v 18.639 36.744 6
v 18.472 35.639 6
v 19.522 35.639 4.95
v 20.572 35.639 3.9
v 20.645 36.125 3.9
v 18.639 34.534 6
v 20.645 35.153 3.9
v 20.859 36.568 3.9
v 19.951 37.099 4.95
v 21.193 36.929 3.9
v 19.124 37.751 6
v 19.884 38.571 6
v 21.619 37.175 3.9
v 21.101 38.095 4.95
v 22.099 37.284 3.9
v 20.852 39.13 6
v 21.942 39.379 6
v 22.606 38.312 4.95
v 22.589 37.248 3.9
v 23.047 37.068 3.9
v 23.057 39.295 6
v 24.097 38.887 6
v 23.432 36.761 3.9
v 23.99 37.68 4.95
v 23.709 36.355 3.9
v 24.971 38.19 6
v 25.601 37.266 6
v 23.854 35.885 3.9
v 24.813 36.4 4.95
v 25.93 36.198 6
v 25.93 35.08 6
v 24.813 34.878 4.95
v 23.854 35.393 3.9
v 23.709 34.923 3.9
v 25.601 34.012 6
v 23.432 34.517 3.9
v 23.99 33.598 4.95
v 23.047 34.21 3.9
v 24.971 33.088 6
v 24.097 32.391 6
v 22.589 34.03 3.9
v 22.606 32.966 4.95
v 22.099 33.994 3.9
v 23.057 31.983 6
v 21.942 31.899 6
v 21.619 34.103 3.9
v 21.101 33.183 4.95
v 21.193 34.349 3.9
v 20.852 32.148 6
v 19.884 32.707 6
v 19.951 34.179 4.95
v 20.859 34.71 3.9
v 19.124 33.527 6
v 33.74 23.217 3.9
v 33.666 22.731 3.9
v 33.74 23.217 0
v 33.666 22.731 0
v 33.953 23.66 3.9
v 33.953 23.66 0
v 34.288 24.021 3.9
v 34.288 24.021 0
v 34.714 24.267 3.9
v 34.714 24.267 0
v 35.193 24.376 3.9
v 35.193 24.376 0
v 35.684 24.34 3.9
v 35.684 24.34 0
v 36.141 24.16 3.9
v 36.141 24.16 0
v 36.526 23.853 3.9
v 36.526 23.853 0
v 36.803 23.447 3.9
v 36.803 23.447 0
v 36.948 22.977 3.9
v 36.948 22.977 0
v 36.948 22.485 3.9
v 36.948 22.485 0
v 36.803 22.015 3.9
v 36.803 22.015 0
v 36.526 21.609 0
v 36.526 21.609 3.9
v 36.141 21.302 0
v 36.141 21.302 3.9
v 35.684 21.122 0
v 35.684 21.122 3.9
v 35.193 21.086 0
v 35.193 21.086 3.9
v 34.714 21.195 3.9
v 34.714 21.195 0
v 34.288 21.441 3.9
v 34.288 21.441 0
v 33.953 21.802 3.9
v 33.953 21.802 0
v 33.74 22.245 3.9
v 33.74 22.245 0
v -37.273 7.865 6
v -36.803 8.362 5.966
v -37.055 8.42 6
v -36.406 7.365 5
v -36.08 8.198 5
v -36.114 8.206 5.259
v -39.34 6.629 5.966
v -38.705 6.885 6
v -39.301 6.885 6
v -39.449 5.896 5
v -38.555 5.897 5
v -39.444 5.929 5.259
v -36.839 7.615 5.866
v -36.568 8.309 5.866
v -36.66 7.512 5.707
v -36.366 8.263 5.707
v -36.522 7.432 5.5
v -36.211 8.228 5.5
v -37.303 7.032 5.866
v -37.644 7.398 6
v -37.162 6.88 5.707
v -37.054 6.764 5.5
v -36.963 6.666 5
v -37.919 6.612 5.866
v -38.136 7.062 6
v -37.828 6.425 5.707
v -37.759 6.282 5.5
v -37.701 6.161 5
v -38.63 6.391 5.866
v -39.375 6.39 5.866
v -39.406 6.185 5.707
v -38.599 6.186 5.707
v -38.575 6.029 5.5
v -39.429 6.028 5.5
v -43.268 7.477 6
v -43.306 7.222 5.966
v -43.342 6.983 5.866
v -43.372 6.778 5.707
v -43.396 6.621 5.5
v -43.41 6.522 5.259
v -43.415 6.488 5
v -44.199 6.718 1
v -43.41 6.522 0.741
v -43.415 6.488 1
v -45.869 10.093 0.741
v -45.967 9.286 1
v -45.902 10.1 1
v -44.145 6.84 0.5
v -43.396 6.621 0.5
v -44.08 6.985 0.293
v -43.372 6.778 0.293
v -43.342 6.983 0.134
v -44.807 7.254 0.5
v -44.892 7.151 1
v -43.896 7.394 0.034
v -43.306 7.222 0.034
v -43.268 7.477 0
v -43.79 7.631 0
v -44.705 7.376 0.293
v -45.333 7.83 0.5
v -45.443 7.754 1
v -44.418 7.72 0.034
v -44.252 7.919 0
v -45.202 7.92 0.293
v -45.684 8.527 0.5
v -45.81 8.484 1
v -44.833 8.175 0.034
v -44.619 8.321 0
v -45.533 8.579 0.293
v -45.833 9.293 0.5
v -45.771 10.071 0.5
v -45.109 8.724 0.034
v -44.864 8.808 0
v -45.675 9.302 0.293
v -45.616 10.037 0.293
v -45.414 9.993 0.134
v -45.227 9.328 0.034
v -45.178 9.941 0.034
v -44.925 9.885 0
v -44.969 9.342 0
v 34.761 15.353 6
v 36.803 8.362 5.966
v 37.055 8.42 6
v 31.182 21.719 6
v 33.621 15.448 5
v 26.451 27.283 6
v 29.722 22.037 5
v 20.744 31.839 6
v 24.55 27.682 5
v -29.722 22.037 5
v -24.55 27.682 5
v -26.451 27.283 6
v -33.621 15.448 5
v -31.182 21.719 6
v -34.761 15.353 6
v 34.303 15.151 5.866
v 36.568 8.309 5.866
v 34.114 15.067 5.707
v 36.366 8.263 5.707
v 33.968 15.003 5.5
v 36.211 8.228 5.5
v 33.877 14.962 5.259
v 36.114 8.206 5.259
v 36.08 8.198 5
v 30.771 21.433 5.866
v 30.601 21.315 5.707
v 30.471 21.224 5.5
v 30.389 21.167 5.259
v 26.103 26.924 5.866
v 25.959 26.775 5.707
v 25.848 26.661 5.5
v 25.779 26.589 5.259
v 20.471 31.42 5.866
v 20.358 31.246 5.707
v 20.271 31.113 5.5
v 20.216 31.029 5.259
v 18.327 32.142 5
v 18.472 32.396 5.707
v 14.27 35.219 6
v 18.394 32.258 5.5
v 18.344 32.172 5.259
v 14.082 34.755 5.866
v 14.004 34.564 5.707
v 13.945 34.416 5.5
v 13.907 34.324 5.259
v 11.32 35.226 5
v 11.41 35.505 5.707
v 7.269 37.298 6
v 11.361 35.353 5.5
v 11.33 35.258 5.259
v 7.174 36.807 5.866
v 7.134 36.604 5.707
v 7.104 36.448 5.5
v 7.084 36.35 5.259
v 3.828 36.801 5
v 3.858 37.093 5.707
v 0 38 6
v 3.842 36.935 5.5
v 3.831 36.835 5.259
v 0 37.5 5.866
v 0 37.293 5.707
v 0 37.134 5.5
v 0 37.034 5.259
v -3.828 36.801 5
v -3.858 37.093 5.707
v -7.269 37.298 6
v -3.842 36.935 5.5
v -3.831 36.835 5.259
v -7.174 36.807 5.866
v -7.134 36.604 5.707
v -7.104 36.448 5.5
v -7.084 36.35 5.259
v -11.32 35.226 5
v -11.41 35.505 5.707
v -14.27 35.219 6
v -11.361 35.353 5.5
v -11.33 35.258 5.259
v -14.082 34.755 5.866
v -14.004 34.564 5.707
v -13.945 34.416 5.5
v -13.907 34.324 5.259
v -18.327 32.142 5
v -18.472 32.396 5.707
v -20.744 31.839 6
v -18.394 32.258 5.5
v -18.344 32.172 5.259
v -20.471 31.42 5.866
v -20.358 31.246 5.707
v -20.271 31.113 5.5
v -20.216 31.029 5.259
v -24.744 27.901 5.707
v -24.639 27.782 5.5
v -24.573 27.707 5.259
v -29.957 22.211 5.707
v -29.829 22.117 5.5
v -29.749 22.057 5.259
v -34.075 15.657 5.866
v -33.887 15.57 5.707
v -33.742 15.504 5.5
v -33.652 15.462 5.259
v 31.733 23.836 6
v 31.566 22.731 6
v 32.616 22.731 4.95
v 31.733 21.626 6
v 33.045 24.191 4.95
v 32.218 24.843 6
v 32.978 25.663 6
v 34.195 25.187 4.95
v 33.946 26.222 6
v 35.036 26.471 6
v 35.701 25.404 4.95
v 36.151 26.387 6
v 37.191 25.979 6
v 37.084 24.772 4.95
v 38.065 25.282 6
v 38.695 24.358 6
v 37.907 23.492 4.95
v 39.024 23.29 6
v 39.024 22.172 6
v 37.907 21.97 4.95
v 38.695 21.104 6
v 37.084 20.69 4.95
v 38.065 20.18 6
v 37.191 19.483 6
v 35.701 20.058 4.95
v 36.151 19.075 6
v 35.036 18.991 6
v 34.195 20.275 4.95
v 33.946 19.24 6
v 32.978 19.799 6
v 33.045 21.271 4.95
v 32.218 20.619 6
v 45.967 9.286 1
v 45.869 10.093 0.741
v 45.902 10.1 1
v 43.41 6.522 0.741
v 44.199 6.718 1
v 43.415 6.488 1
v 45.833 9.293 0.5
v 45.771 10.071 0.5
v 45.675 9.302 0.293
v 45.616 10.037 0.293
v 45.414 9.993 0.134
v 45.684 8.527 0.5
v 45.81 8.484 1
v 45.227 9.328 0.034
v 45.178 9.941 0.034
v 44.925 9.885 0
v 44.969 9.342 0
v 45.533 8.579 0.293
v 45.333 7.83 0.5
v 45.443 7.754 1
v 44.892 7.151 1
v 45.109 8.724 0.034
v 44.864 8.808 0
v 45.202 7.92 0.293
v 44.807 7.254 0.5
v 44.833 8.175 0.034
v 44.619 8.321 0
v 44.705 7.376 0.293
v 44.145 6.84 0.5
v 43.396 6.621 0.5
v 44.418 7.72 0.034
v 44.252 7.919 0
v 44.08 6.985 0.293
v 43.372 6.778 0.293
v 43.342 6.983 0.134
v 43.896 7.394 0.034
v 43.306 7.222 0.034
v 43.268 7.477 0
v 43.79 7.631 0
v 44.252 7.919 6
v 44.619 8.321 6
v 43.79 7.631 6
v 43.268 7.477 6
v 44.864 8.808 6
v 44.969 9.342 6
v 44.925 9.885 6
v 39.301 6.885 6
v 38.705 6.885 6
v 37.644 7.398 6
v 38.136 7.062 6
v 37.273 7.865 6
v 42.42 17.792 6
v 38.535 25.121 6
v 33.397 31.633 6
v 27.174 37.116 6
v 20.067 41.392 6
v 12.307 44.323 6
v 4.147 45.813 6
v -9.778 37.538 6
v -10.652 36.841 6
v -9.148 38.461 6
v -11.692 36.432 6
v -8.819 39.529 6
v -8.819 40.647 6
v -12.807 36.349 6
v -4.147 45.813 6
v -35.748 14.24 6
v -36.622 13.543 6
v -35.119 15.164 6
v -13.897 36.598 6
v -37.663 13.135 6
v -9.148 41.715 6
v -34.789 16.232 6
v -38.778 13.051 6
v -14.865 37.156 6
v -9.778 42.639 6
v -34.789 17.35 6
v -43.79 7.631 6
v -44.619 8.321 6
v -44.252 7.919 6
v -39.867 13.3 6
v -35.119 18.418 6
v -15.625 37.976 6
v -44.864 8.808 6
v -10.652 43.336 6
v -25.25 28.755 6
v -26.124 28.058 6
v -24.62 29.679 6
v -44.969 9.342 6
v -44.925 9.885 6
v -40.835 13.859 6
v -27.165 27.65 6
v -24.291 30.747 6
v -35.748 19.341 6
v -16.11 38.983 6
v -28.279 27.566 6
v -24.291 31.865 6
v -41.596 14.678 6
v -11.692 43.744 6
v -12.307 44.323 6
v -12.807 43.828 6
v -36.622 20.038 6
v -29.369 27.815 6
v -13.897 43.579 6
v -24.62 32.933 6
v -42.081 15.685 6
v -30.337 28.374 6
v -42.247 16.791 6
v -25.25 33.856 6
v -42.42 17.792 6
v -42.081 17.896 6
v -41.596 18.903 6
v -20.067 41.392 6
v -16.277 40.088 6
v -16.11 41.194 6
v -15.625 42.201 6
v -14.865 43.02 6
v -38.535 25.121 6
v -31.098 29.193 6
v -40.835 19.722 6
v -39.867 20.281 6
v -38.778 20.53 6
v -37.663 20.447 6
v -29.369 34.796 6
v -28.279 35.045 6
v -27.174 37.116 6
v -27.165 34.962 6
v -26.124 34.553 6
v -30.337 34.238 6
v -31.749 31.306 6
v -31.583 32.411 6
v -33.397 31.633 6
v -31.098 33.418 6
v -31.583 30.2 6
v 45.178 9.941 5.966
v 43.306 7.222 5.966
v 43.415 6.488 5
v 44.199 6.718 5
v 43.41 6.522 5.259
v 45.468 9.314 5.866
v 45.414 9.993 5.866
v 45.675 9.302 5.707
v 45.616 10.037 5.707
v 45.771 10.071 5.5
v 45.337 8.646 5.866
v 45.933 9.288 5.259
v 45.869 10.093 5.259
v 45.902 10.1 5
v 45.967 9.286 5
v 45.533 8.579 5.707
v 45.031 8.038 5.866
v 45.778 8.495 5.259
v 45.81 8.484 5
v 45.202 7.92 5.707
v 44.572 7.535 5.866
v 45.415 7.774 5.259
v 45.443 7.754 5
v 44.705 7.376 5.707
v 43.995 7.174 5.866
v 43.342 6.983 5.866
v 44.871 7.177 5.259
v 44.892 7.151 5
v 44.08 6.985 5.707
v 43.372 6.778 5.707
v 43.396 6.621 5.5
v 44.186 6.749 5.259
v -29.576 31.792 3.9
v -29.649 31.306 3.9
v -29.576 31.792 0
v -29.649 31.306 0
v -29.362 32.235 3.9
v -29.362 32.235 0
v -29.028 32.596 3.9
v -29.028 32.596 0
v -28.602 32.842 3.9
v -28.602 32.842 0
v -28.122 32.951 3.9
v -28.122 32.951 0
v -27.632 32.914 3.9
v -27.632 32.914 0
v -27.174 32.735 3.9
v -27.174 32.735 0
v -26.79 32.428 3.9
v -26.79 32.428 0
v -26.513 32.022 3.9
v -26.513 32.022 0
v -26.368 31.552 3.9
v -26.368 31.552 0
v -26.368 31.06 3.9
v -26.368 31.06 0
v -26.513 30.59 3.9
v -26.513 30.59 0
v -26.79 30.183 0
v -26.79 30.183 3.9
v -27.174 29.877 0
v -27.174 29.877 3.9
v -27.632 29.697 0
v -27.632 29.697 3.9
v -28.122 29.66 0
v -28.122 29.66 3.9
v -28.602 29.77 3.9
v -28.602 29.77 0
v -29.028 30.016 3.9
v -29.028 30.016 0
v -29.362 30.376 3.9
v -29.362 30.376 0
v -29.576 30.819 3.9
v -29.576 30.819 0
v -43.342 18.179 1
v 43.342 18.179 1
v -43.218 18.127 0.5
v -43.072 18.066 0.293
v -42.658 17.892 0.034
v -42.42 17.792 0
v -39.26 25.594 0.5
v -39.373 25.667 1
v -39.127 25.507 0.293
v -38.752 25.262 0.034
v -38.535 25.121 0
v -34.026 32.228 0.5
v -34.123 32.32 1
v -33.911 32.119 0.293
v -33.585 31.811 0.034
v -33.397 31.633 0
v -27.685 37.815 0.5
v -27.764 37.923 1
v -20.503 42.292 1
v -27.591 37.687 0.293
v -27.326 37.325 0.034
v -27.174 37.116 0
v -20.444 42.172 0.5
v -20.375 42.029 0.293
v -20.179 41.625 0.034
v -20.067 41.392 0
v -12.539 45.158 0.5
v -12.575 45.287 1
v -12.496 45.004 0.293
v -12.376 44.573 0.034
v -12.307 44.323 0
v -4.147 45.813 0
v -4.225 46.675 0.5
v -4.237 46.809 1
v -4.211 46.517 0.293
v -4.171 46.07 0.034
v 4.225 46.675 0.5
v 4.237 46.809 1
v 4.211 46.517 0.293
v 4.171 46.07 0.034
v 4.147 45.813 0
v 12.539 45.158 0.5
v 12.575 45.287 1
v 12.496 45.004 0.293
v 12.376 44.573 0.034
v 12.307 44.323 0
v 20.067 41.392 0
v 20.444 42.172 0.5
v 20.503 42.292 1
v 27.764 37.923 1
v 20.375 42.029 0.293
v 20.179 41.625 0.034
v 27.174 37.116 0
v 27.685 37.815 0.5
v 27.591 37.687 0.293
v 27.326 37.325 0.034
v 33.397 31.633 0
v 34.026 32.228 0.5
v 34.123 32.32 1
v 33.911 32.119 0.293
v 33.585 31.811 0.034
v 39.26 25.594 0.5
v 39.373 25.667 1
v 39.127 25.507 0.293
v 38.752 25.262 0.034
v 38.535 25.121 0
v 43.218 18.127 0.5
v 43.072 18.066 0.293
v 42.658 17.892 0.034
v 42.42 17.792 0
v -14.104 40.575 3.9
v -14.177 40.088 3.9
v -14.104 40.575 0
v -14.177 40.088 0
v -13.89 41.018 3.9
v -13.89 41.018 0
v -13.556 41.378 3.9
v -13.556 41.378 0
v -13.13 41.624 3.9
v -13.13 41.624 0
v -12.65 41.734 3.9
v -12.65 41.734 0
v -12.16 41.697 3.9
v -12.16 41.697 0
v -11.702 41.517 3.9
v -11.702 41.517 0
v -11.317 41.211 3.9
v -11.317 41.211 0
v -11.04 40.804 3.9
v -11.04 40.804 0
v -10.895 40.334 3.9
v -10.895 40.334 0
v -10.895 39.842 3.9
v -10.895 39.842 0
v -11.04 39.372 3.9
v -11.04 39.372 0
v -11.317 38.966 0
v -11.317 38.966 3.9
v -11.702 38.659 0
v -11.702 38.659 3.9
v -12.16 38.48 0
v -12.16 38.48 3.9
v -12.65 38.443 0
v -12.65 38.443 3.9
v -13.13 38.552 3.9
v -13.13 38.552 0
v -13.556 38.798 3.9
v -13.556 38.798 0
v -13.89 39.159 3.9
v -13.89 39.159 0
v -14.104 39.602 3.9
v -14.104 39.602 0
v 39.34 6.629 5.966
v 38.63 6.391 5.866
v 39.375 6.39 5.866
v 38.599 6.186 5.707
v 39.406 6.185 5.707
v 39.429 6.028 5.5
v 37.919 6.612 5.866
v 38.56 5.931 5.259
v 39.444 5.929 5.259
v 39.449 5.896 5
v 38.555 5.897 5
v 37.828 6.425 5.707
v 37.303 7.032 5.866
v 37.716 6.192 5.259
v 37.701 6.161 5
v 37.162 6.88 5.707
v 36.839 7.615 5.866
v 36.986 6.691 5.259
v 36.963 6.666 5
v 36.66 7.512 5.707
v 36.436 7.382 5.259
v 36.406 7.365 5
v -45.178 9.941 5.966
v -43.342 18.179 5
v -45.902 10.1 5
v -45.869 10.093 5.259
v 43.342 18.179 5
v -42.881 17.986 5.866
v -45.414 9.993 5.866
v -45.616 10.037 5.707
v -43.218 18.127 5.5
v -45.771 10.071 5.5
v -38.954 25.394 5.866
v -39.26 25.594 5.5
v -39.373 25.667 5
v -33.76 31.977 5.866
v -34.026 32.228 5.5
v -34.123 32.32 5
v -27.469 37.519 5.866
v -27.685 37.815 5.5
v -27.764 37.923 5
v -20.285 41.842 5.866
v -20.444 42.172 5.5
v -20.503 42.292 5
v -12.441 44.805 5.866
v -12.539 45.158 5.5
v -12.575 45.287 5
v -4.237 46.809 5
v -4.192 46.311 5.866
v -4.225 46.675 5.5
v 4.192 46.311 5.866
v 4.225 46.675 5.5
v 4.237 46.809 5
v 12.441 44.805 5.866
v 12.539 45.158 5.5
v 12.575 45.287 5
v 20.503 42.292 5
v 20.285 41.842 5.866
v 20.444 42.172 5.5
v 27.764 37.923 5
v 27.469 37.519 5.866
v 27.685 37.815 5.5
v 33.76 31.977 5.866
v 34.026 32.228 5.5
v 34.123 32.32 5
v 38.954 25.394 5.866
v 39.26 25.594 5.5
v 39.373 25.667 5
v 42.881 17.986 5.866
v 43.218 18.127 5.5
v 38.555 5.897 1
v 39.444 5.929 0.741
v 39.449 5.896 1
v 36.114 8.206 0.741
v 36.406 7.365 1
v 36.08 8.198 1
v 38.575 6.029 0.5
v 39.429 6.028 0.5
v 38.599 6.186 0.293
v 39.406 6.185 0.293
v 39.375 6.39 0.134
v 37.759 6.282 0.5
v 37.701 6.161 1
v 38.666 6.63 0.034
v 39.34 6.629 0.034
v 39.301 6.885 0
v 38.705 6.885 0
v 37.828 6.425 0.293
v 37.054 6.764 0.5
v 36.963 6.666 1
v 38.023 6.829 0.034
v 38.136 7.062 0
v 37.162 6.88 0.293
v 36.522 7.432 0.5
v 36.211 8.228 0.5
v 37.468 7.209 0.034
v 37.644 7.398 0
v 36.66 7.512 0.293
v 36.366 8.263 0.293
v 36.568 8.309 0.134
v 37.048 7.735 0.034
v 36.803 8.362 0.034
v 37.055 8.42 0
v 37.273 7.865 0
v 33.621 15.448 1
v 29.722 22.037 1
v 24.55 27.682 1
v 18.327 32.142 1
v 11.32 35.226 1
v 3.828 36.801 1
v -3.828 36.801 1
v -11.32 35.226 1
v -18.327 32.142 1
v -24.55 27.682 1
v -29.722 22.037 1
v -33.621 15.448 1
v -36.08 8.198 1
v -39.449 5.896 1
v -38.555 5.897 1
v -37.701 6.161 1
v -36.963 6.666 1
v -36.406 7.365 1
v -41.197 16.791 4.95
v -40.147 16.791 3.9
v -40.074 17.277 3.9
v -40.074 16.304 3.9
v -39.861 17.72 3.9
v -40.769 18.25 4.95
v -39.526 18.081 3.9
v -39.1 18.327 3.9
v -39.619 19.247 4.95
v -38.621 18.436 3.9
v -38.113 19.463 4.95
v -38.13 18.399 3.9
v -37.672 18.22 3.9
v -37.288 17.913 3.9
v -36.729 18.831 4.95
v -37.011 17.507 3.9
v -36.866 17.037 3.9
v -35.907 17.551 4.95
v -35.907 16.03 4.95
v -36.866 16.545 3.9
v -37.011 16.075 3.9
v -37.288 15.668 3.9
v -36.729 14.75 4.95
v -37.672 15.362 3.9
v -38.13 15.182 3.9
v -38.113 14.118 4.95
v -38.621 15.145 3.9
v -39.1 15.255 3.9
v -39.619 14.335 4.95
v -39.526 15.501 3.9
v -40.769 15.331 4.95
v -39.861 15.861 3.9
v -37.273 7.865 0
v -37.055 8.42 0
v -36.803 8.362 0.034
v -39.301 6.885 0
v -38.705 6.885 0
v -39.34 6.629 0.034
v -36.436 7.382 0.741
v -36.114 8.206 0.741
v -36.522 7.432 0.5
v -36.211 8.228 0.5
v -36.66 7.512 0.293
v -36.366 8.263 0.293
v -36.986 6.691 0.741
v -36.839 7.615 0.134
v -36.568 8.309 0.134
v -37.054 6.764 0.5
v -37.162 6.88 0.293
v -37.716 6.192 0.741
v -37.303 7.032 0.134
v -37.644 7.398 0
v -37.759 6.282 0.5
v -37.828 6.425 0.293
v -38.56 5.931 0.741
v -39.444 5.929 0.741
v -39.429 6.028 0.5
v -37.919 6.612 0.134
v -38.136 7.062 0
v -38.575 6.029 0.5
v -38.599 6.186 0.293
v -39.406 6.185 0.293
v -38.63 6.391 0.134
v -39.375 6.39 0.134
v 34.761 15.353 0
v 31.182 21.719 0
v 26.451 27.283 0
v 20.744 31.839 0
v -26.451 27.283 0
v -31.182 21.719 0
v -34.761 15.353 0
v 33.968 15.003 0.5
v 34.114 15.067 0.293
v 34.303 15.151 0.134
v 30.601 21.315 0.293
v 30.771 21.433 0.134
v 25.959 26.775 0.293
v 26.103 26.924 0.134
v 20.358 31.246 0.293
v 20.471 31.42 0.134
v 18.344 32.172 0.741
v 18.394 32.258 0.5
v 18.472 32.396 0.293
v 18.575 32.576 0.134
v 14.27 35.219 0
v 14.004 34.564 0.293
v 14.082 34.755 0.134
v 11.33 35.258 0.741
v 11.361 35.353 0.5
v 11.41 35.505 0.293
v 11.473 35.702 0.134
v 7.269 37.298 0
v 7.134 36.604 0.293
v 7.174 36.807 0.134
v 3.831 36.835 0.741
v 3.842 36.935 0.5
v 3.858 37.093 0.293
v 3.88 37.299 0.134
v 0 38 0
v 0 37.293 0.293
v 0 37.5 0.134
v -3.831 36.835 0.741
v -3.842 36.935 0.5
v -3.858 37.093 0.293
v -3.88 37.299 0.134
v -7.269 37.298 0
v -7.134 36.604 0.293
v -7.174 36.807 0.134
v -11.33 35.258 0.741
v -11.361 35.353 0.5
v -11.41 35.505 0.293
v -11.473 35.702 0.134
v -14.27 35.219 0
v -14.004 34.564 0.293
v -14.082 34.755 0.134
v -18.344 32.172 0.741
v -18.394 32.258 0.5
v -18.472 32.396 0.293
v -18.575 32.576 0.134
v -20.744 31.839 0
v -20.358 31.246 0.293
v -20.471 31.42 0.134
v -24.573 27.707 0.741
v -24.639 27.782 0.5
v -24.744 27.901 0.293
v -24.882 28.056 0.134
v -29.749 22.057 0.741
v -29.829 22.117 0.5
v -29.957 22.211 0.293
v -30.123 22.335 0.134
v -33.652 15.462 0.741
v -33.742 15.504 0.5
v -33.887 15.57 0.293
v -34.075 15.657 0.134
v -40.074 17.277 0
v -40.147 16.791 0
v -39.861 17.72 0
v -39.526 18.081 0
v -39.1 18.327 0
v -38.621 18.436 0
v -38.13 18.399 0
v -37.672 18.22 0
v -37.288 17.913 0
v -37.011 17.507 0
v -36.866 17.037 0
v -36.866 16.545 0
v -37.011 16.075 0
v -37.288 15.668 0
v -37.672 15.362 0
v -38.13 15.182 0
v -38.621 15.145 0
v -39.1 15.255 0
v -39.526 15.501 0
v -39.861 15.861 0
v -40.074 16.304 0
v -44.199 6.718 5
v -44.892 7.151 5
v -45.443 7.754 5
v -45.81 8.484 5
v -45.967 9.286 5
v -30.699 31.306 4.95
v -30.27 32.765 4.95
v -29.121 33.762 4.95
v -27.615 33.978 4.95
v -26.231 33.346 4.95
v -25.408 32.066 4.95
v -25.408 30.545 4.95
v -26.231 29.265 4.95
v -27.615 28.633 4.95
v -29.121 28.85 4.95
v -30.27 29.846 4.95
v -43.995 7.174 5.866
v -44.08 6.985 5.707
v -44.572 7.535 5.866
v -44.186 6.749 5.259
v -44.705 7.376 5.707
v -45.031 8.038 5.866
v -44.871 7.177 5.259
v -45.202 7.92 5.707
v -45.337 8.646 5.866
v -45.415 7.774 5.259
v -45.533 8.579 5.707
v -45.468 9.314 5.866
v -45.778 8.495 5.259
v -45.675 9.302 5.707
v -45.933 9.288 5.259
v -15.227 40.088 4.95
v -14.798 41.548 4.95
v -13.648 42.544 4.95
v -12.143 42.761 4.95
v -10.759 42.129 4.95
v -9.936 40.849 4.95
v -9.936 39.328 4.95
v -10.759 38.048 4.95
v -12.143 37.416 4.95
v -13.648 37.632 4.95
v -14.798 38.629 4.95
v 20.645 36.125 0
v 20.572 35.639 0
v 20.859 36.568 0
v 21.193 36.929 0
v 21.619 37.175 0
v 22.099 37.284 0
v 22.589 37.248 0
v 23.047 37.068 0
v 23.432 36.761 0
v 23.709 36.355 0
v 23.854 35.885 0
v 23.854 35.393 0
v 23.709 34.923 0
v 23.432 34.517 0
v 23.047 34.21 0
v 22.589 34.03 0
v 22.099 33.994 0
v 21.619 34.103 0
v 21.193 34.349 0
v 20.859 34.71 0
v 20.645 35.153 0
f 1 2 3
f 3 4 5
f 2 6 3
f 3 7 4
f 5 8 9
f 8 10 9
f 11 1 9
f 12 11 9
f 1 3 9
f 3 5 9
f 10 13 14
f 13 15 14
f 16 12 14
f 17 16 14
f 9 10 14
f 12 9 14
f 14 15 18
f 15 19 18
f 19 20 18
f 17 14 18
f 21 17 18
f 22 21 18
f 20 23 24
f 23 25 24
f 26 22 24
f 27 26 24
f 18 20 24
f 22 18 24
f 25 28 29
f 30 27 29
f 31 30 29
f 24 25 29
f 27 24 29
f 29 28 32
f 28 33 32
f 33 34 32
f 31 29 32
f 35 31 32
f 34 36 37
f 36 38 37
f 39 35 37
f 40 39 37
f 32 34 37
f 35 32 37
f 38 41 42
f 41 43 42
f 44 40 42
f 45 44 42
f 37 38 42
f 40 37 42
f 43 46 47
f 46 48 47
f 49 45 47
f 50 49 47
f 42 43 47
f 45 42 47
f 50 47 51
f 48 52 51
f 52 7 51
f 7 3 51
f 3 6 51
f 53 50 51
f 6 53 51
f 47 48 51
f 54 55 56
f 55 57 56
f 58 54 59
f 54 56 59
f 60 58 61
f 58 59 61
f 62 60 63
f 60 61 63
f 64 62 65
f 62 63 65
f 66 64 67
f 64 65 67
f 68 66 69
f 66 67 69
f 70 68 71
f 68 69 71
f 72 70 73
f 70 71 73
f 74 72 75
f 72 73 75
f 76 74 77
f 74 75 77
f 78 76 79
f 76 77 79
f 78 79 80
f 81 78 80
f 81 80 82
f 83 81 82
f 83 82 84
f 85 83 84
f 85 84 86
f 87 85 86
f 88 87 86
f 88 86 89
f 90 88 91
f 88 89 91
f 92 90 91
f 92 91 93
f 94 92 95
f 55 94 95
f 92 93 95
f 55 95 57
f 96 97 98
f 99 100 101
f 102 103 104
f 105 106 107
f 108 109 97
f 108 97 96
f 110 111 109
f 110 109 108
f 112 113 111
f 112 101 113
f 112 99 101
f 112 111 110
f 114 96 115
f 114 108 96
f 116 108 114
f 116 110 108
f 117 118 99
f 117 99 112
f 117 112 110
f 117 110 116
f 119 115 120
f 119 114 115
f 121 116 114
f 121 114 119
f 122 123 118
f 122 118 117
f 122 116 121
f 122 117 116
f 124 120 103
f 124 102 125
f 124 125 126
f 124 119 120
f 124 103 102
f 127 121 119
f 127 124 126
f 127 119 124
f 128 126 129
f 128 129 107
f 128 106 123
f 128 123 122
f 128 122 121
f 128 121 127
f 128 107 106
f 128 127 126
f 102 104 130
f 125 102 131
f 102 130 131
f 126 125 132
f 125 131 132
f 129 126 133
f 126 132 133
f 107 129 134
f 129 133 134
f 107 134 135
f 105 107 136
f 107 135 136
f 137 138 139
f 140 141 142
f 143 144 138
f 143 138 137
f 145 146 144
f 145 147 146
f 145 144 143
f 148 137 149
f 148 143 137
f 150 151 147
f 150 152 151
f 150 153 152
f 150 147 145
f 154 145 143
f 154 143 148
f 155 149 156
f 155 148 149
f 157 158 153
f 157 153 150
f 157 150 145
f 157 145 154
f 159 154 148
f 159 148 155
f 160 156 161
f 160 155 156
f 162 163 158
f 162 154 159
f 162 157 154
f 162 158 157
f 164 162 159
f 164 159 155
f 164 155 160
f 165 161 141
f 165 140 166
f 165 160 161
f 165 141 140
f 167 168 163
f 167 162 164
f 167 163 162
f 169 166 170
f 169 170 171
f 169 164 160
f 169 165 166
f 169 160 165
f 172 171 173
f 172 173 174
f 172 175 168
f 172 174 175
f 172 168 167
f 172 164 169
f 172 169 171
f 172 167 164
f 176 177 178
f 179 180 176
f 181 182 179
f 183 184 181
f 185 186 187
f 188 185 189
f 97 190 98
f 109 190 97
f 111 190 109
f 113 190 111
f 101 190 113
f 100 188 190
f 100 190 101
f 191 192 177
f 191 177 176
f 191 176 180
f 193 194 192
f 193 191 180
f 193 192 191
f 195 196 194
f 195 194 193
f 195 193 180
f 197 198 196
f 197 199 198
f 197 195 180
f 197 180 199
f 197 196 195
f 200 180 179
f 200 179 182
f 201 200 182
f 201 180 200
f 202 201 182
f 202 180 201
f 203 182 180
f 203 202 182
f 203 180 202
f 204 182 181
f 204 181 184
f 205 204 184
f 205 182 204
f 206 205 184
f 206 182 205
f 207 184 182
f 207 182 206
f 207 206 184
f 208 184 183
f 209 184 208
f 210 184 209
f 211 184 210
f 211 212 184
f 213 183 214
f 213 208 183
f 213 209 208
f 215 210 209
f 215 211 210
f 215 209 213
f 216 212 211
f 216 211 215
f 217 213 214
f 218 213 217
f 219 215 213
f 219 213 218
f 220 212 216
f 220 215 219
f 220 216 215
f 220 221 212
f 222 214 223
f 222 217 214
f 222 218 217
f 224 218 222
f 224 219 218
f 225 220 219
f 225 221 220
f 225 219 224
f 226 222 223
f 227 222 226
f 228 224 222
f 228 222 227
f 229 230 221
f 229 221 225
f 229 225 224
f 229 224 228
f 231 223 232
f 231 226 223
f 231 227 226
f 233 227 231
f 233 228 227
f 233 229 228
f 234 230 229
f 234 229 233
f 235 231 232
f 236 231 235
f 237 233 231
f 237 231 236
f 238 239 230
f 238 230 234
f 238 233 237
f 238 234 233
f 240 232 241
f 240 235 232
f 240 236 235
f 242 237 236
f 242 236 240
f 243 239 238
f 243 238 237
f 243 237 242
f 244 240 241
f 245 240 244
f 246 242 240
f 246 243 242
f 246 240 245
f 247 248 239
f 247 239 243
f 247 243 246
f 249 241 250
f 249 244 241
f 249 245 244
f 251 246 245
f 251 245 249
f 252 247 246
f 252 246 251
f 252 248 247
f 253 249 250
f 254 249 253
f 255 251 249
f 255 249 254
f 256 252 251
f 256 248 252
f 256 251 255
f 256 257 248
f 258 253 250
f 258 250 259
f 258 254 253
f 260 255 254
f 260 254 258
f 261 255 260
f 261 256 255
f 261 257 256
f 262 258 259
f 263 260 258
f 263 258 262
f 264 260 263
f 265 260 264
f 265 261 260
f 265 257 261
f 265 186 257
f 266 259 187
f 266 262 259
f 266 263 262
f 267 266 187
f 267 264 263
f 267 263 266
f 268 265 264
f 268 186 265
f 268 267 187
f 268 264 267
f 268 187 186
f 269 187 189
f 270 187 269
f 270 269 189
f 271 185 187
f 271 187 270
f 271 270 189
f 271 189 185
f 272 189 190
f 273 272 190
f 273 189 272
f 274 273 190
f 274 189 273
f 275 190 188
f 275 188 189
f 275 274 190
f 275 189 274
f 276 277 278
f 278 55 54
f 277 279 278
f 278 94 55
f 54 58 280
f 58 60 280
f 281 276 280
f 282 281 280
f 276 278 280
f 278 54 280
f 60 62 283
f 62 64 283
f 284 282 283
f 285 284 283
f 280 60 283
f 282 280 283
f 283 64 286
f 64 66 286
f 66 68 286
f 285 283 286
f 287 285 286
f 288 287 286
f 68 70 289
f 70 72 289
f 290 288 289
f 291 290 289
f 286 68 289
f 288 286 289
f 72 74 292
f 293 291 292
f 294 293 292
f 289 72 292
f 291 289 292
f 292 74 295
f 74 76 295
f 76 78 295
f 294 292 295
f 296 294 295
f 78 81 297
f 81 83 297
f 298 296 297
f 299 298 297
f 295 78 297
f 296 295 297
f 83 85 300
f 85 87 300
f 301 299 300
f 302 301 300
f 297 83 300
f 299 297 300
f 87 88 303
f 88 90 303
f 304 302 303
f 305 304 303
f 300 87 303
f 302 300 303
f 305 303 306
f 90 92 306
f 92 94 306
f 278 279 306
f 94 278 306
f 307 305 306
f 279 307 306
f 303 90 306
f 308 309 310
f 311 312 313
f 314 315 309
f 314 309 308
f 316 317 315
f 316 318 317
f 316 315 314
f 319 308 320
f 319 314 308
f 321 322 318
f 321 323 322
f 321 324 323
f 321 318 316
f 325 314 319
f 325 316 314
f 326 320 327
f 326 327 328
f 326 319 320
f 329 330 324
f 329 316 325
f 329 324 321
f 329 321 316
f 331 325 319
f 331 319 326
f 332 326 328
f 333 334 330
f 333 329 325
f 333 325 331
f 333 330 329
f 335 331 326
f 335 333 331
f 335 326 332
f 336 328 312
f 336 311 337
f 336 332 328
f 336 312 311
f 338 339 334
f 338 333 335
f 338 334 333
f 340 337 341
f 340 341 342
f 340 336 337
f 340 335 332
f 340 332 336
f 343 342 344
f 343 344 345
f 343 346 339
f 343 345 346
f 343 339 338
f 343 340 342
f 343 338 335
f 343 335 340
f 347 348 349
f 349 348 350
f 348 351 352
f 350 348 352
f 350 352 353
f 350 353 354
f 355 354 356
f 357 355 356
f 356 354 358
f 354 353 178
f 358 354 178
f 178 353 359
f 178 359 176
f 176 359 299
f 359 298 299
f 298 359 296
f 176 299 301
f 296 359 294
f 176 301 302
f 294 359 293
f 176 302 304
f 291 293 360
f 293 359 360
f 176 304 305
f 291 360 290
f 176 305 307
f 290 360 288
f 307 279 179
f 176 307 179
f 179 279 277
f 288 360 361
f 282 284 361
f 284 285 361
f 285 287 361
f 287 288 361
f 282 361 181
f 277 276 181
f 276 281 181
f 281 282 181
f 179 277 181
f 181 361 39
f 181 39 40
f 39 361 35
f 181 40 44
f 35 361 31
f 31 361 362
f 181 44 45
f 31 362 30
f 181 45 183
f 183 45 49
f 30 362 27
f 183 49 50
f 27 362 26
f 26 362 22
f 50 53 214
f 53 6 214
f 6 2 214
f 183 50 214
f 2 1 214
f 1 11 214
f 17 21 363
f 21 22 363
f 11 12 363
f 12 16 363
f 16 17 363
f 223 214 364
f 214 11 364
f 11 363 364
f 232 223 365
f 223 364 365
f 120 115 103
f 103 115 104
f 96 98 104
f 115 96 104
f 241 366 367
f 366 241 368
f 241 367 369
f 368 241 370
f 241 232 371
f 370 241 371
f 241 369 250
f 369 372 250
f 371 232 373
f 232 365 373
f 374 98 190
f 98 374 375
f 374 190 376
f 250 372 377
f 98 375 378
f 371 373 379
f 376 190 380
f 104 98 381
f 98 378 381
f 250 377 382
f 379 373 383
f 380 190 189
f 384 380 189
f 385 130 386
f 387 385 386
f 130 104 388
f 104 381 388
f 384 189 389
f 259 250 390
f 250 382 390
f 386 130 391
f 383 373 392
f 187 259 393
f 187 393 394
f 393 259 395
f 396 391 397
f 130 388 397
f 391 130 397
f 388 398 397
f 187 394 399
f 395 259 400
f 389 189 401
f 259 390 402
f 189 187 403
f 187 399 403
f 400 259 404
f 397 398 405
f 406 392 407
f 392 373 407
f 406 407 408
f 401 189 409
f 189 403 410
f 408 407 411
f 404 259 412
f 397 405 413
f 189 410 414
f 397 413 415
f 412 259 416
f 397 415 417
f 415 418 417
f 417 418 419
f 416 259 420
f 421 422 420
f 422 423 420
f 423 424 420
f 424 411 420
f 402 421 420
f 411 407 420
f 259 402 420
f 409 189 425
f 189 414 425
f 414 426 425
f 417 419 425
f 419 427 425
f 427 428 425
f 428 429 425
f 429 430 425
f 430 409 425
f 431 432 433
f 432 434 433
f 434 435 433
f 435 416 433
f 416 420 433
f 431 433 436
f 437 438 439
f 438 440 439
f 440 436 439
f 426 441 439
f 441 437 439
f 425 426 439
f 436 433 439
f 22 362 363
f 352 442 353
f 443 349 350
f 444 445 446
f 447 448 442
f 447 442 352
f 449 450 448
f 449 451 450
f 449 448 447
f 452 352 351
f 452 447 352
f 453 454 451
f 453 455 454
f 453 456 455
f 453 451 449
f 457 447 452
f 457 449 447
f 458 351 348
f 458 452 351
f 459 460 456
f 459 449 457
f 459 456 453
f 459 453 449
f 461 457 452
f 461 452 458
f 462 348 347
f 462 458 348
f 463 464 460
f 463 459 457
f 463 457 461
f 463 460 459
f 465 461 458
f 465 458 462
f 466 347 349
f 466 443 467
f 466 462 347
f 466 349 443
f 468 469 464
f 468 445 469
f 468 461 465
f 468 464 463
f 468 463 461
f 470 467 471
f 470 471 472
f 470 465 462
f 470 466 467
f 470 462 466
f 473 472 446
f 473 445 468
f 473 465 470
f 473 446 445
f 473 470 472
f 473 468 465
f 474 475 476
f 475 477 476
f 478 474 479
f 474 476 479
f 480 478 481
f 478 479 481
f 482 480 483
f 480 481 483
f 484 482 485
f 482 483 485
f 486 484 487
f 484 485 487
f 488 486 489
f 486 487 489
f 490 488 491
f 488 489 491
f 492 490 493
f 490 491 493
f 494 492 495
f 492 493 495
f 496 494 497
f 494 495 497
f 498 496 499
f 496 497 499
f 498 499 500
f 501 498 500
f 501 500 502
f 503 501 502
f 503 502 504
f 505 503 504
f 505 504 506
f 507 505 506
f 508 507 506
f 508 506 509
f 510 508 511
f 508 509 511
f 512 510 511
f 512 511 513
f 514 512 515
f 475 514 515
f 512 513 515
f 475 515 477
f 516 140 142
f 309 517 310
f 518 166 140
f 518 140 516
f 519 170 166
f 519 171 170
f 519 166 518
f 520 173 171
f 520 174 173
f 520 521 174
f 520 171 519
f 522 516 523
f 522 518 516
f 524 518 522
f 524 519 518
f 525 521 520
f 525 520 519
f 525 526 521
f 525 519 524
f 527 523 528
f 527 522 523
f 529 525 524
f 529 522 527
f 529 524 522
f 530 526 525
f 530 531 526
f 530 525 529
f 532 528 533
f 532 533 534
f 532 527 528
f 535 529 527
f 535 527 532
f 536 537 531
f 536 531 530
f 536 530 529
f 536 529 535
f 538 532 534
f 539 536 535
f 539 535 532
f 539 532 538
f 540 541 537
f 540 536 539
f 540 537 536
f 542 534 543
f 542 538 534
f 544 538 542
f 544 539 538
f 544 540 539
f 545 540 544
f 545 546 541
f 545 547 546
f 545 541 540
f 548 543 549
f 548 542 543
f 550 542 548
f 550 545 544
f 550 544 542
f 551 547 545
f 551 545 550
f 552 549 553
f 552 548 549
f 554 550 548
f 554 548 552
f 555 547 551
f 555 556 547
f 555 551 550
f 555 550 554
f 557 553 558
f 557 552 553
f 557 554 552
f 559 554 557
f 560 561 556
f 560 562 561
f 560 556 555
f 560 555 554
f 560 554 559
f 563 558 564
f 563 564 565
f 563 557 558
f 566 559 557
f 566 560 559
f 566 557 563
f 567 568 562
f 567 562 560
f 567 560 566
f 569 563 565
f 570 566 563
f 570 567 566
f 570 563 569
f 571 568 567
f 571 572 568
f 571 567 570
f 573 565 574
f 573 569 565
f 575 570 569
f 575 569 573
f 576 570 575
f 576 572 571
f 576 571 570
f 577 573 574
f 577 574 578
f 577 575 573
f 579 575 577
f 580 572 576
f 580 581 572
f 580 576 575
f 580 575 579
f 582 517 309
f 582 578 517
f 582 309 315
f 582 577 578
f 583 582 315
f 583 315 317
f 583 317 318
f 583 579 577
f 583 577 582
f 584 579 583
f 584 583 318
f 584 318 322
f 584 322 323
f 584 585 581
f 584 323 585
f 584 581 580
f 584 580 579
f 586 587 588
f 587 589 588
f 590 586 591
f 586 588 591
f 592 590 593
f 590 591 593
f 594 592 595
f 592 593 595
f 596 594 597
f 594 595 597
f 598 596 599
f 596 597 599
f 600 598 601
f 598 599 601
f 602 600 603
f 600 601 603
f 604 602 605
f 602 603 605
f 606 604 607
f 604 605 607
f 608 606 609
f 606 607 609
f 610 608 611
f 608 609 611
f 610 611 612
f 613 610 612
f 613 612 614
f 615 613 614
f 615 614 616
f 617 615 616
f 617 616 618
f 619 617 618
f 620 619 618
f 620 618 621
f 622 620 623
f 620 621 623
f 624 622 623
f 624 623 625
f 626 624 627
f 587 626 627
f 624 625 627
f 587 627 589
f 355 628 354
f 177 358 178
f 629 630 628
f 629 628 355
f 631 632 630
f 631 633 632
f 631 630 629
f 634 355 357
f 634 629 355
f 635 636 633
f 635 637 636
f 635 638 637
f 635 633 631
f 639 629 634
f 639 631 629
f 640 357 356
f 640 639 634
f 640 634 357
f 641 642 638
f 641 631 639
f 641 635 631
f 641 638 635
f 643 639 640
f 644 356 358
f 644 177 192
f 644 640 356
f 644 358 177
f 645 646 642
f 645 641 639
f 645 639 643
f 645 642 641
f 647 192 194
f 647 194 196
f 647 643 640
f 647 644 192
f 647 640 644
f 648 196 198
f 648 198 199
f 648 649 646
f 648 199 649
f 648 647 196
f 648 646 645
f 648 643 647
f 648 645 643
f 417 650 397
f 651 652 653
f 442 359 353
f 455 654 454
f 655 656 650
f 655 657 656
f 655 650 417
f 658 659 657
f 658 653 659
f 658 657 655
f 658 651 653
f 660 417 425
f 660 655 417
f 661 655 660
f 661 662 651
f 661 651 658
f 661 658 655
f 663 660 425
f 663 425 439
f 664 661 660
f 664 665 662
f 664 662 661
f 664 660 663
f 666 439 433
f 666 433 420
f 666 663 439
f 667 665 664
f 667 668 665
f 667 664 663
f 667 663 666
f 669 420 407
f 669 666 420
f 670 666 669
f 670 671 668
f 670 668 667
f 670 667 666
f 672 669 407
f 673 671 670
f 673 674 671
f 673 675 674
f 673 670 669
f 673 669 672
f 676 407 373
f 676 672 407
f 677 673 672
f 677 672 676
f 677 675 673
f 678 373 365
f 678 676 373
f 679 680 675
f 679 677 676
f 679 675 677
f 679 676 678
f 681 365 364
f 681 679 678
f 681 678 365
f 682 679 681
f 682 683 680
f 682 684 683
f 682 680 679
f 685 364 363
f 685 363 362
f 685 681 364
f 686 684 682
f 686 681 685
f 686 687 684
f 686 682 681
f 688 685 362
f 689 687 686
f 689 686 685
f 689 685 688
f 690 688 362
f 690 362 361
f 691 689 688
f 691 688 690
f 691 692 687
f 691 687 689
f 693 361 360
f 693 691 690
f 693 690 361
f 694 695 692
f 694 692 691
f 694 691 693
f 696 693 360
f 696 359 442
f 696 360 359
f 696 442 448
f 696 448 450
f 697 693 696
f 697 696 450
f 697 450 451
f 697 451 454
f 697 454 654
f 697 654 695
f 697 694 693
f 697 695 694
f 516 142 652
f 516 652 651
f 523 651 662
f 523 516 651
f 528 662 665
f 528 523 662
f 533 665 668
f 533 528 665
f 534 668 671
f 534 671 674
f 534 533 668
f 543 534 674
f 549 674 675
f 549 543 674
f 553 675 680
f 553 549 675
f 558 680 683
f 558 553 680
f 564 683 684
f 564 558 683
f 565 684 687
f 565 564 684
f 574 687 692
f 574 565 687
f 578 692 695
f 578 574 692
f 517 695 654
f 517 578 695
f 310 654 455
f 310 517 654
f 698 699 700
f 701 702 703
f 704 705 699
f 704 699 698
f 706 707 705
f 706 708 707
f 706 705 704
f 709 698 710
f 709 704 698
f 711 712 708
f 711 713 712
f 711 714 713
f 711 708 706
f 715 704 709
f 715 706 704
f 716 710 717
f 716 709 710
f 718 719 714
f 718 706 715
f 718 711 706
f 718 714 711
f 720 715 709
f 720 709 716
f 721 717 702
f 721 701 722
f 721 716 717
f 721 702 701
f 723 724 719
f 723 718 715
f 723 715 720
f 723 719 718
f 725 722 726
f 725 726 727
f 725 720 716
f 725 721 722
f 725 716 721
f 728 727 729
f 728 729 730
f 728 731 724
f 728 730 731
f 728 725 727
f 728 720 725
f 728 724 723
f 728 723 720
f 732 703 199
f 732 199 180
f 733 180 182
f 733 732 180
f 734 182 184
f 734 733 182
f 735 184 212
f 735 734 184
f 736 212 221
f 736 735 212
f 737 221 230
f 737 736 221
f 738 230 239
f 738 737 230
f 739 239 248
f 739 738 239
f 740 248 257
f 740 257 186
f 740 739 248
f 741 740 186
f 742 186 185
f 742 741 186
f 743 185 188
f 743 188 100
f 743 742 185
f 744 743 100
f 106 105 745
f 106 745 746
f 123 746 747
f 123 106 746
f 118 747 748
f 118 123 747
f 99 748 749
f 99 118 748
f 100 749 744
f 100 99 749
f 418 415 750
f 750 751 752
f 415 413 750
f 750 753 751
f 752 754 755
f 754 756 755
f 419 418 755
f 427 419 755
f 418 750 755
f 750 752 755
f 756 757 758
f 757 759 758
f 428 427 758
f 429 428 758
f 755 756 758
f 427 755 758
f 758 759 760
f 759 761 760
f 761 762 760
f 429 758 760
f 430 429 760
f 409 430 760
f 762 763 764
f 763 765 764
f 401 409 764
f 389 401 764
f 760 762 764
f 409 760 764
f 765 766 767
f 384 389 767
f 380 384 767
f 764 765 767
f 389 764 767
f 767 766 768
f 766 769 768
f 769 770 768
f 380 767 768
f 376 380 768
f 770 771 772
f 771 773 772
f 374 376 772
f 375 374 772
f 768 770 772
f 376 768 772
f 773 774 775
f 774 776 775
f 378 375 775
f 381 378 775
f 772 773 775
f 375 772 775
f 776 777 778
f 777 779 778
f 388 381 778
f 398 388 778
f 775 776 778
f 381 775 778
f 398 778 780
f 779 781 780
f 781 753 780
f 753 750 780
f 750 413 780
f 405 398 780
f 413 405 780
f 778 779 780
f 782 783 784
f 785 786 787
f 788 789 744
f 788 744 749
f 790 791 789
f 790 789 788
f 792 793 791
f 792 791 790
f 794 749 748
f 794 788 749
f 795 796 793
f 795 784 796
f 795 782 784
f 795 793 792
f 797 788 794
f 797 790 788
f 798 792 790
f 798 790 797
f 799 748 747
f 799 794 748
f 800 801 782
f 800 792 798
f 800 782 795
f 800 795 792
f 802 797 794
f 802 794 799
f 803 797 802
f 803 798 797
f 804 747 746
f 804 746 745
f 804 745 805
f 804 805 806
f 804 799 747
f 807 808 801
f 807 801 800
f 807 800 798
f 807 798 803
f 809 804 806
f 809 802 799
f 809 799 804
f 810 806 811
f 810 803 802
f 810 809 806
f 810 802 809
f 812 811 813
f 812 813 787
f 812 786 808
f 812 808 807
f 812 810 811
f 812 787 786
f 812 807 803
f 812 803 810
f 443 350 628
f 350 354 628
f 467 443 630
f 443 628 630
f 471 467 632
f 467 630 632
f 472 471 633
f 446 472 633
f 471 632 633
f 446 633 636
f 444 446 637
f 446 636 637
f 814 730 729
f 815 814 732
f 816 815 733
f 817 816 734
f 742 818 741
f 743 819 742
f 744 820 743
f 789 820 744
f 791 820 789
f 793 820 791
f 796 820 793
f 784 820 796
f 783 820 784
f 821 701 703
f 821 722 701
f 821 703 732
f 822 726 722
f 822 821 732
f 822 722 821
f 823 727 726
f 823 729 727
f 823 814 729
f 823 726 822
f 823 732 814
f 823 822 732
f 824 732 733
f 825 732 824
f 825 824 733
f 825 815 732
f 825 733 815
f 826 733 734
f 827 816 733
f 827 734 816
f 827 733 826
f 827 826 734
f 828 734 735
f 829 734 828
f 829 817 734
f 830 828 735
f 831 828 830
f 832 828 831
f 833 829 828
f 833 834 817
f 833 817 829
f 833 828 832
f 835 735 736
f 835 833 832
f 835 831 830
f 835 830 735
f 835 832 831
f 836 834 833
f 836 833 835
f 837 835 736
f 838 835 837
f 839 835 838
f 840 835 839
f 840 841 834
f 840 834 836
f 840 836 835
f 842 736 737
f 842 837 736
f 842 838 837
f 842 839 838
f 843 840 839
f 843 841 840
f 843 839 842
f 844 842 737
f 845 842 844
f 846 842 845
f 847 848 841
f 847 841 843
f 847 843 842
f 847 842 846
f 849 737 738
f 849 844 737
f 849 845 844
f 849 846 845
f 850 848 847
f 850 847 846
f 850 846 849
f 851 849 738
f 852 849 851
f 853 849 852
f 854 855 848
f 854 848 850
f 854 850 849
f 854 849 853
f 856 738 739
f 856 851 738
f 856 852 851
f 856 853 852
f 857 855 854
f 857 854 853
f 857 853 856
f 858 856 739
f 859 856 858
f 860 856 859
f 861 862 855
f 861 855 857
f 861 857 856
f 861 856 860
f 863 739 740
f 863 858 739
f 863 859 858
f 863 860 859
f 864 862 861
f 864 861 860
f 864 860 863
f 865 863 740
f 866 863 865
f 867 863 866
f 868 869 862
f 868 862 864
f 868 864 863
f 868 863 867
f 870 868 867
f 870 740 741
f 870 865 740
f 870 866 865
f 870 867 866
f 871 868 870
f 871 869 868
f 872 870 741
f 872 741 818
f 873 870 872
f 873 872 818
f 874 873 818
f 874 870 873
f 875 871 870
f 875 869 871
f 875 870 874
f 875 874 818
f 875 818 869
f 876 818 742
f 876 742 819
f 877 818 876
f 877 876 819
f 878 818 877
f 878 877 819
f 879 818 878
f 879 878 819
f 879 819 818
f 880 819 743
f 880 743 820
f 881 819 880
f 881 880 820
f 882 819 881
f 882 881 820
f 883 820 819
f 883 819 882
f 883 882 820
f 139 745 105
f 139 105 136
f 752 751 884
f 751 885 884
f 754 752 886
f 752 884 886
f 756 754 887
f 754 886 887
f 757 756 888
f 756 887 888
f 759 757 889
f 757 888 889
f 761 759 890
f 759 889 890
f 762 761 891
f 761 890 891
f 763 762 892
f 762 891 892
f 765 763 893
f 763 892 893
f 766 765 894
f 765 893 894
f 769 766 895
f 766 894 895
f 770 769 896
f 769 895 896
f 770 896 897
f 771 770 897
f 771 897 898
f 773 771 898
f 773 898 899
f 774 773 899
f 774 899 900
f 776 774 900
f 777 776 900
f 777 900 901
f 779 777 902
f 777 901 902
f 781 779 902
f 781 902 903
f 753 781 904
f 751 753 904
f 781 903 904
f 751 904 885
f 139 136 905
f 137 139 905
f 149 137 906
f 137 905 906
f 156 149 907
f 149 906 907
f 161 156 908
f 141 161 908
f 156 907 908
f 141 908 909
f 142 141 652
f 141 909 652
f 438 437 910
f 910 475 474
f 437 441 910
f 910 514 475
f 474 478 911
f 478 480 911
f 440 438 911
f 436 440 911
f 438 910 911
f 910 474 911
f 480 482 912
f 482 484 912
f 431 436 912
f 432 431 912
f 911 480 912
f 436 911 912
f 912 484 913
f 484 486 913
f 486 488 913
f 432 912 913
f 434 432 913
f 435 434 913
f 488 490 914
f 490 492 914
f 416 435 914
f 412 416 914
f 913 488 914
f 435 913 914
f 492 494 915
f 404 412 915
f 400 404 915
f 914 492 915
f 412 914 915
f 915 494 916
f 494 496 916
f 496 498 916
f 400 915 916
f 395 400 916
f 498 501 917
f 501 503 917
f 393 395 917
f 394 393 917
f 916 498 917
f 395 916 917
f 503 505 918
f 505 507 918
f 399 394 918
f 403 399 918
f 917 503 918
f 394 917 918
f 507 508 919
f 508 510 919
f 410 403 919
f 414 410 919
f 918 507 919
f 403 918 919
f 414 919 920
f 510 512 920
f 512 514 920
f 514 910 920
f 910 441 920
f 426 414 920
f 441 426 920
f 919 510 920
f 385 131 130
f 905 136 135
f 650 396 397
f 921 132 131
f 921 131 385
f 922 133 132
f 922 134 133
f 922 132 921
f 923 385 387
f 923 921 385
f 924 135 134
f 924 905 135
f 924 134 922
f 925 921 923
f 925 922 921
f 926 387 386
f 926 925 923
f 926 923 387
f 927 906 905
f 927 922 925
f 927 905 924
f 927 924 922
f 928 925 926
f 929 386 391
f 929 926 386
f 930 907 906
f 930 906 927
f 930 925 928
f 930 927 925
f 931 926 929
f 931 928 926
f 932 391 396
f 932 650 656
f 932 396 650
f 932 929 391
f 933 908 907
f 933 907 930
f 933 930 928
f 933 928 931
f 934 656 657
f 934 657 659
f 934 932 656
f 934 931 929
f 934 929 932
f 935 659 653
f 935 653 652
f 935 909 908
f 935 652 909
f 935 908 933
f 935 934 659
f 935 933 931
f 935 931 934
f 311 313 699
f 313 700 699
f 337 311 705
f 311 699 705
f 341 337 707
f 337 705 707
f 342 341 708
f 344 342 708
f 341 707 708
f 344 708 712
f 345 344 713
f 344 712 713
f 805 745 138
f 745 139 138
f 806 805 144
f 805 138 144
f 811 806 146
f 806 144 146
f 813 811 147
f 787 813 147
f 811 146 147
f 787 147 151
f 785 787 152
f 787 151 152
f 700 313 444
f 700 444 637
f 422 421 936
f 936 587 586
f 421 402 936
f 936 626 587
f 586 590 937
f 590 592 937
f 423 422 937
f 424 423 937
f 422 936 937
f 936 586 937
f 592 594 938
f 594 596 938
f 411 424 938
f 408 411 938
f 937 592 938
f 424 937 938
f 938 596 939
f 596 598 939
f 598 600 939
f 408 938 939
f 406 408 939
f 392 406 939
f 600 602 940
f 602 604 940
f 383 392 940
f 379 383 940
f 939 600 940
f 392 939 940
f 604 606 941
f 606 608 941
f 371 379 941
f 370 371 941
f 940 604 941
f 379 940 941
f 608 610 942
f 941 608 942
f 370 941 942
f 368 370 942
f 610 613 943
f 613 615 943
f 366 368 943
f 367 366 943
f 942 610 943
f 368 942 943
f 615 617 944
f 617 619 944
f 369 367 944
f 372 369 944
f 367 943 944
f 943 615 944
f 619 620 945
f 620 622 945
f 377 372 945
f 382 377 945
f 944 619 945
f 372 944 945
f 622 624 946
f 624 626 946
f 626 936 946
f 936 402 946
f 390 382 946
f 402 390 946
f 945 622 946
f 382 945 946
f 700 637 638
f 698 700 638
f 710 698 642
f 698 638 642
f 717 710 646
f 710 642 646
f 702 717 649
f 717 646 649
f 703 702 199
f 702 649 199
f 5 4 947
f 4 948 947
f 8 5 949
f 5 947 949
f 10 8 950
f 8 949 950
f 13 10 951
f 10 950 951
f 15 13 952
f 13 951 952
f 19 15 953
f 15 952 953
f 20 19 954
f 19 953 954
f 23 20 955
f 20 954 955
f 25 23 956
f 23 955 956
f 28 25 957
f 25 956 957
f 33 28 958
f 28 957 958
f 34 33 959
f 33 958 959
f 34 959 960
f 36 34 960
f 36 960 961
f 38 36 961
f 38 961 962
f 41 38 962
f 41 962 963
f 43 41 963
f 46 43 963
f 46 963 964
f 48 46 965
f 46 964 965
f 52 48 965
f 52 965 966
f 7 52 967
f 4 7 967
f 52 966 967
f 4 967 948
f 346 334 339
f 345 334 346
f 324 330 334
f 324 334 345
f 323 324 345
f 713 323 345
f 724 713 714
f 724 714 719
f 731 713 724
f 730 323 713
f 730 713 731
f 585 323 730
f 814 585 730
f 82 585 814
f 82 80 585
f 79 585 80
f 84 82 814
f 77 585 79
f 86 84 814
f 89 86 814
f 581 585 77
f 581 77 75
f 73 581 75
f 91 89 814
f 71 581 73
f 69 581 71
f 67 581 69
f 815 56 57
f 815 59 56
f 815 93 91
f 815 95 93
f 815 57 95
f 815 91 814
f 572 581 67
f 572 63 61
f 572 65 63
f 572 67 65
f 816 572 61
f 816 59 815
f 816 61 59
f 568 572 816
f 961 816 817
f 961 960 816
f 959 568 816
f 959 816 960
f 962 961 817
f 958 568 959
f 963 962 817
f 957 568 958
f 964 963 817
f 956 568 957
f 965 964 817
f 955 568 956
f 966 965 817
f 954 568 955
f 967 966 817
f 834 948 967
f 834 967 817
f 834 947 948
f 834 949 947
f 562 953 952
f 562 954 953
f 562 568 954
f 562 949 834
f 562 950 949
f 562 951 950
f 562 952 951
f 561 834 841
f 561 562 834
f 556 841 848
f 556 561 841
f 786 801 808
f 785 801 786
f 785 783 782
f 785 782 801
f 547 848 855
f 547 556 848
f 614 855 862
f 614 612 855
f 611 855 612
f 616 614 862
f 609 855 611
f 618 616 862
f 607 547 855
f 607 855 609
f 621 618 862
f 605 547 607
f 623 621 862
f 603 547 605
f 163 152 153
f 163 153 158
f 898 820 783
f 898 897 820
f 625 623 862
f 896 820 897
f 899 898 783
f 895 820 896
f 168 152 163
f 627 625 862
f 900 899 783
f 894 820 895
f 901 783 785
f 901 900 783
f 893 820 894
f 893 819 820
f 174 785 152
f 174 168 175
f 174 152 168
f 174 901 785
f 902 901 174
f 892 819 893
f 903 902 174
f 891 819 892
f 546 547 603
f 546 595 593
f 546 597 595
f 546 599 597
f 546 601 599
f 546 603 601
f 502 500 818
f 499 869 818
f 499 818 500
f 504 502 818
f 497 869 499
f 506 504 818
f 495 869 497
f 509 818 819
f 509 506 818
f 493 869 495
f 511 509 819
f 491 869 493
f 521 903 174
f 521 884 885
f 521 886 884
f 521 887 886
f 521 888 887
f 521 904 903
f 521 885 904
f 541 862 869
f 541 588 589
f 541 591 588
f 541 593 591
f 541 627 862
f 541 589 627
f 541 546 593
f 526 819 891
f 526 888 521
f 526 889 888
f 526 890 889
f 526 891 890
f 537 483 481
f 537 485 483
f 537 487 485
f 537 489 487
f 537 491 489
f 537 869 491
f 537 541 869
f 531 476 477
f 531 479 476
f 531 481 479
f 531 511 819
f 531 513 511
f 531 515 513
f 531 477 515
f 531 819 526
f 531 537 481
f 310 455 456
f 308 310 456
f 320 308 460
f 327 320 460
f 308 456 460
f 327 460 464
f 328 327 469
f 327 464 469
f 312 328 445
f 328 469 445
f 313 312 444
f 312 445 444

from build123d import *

# Parameters (mm, degrees)
EXTRUDE_1_DEPTH           = 6
FILLET_1_R                = 3
HOLE_WIZARD_1_D           = 3.3
HOLE_WIZARD_1_DEPTH       = 7.5
HOLE_WIZARD_1_CSINK_D     = 7.5
HOLE_WIZARD_1_CSINK_ANGLE = 90
HOLE_WIZARD_1_TIP         = 0.991420021
FILLET_2_R                = 1


with BuildPart() as part:
    # 草图1 → 凸台-拉伸1 (new body)
    with BuildSketch(Plane.XY):
        with BuildLine():
            Line((-36.593586944, 5.468948212), (-46.483745578, 6.947042323))
            ThreePointArc((-46.483745578, 6.947042323), (0, 47), (46.483745578, 6.947042323))
            Line((46.483745578, 6.947042323), (36.593586944, 5.468948212))
            ThreePointArc((36.593586944, 5.468948212), (0, 37), (-36.593586944, 5.468948212))
        make_face()
    extrude(amount=EXTRUDE_1_DEPTH)

    # 圆角1
    fillet_1_edges = [part.edges().sort_by_distance(p)[0] for p in [
        (46.483745578, 6.947042323, 3),
        (36.593586944, 5.468948212, 3),
        (-36.593586944, 5.468948212, 3),
        (-46.483745578, 6.947042323, 3),
    ]]
    fillet(fillet_1_edges, radius=FILLET_1_R)

    # 打孔尺寸(%根据)内六角花形半沉头螺钉的类型1
    with Locations(Plane.XY.offset(6)):
        with Locations((-38.497337773, 16.790620208), (-27.999109004, 31.305656064), (-12.526872455, 40.088366806), (22.222162979, 35.639001962), (35.316348104, 22.730988481)):
            CounterSinkHole(HOLE_WIZARD_1_D / 2, HOLE_WIZARD_1_CSINK_D / 2, depth=HOLE_WIZARD_1_DEPTH, counter_sink_angle=HOLE_WIZARD_1_CSINK_ANGLE)
            with Locations((0, 0, -(HOLE_WIZARD_1_DEPTH + HOLE_WIZARD_1_TIP / 2))):  # 118° drill point
                Cone(0, HOLE_WIZARD_1_D / 2, HOLE_WIZARD_1_TIP, mode=Mode.SUBTRACT)

    # 圆角2
    fillet_2_edges = [part.edges().sort_by_distance(p)[0] for p in [
        (41.432322076, 6.192102022, 0),
        (41.432322076, 6.192102022, 6),
        (0, 47, 0),
        (0, 37, 0),
        (-41.432322076, 6.192102022, 0),
        (-37.313071306, 6.385935339, 0),
        (-45.443039337, 7.754357798, 0),
        (45.443039337, 7.754357798, 0),
        (37.313071306, 6.385935339, 0),
        (0, 37, 6),
        (0, 47, 6),
        (-41.432322076, 6.192102022, 6),
        (-37.313071306, 6.385935339, 6),
        (-45.443039337, 7.754357798, 6),
        (45.443039337, 7.754357798, 6),
        (37.313071306, 6.385935339, 6),
    ]]
    fillet(fillet_2_edges, radius=FILLET_2_R)


solid = part.part
